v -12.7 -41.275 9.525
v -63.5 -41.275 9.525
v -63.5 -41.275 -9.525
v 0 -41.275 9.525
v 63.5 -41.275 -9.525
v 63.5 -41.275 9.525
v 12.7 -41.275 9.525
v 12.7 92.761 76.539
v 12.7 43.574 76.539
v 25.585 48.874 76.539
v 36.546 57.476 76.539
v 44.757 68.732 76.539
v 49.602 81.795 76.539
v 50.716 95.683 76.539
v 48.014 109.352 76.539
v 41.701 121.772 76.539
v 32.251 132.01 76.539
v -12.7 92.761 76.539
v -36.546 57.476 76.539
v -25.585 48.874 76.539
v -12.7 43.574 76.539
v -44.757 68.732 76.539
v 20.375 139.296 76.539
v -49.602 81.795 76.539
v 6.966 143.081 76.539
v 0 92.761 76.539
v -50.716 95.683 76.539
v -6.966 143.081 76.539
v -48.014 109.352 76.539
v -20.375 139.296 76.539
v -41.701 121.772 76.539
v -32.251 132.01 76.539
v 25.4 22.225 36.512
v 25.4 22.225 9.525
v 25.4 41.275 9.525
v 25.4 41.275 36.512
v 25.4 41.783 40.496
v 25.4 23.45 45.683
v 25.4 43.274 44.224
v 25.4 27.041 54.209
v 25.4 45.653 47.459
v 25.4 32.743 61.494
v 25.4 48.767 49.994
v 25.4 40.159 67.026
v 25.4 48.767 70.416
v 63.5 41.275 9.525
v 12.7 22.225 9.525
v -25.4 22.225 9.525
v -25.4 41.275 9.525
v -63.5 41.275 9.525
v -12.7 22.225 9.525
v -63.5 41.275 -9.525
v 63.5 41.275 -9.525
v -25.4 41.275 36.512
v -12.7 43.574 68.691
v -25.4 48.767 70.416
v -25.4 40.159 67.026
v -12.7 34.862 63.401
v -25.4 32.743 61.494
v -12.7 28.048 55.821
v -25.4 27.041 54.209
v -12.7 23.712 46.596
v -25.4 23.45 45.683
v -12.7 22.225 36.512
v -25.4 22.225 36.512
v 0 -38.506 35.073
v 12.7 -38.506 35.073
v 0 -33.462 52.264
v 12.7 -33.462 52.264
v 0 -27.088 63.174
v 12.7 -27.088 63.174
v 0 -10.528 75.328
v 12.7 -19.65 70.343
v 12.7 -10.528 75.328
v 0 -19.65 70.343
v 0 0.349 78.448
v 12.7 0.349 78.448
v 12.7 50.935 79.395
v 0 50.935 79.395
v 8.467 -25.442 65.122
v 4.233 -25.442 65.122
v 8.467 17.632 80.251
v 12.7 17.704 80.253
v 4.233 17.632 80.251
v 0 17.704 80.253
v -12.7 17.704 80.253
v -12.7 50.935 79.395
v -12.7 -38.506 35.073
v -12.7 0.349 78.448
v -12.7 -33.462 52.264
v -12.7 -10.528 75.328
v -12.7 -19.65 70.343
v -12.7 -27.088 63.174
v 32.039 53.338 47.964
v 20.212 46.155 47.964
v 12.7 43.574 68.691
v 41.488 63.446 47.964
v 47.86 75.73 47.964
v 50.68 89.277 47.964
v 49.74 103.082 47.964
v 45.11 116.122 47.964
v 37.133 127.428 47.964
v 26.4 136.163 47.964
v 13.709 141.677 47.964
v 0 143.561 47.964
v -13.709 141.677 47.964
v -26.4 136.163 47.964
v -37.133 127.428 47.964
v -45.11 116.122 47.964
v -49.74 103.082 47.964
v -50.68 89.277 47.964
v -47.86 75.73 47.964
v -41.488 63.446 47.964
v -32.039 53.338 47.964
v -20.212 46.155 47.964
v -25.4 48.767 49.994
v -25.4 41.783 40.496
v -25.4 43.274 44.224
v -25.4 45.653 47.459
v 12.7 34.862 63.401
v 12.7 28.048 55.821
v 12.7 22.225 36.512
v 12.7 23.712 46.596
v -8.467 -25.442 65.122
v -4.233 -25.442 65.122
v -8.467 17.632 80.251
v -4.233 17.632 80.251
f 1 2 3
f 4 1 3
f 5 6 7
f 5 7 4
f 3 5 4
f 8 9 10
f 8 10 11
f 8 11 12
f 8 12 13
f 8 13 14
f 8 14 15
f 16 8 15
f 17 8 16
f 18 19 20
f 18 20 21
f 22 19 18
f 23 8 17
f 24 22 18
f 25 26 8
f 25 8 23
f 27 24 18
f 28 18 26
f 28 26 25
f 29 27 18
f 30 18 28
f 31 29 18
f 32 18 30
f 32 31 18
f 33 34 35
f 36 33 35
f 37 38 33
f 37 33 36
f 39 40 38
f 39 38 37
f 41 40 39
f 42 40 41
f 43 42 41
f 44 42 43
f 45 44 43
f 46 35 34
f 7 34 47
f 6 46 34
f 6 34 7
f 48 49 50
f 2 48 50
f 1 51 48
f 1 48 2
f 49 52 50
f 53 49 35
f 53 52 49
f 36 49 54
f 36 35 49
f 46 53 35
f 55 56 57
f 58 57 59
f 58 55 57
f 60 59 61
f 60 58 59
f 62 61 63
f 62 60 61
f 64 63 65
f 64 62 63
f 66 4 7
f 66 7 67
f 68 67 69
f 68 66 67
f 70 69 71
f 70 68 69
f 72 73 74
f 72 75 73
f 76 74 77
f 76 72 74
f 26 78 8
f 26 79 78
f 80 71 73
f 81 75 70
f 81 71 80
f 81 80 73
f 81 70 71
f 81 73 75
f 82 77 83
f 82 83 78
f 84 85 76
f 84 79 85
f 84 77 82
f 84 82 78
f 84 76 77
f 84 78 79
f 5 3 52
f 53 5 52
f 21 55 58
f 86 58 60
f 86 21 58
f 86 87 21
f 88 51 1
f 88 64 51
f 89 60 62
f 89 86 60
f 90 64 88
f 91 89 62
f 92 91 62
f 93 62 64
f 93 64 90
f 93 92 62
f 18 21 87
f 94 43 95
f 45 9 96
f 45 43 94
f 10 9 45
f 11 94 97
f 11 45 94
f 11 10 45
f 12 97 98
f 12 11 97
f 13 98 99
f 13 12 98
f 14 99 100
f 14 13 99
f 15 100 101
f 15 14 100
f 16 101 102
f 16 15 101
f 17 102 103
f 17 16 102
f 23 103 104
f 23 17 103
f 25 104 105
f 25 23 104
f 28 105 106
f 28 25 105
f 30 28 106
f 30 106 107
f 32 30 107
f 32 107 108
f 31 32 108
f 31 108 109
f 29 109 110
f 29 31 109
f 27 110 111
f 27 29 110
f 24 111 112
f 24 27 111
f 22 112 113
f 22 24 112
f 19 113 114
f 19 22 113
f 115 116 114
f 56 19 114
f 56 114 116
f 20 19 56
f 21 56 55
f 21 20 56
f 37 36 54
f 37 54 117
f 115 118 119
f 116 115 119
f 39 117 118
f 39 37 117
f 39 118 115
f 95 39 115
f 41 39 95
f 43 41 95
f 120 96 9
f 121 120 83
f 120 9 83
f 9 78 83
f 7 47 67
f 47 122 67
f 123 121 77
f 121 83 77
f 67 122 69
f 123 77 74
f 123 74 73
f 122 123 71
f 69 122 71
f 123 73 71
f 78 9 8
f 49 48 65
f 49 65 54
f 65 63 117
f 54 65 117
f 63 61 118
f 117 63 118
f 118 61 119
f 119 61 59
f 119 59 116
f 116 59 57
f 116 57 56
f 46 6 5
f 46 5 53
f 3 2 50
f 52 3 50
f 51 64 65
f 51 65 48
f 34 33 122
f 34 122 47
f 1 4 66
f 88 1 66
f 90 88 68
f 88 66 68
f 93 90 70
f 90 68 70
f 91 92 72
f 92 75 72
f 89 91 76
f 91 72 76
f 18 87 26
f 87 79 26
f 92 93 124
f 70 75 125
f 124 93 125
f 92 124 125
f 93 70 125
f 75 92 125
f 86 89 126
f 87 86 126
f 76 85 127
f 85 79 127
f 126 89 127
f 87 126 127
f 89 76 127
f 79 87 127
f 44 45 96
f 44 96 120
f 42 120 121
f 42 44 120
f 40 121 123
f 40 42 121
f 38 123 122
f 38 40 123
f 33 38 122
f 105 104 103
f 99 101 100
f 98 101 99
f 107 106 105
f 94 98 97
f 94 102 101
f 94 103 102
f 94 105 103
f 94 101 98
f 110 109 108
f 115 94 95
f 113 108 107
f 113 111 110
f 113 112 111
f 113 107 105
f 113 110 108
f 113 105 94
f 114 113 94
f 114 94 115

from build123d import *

# Parameters (mm, degrees)
F1_DEPTH = 63.5
F2_DEPTH = 25.4
F3_DEPTH = 12.7


with BuildPart() as f1:
    # F0 (on Right) → F1 (new body, symmetric)
    with BuildSketch(Plane.YZ):
        Polygon((22.225, 9.525), (-41.275, 9.525), (-41.275, -9.525), (41.275, -9.525), (41.275, 9.525), align=None)
    extrude(amount=F1_DEPTH, both=True)

    # F0 (on Right) → F2 (join, symmetric)
    with BuildSketch(Plane.YZ):
        with BuildLine():
            Line((22.225, 36.5125), (22.225, 9.525))
            Line((22.225, 9.525), (41.275, 9.525))
            Line((41.275, 9.525), (41.275, 36.5125))
            ThreePointArc((41.275, 36.5125), (45.92468, 47.73782), (57.15, 52.3875))
            Line((57.15, 52.3875), (92.761105, 52.3875))
            Line((92.761105, 52.3875), (92.761105, 71.4375))
            Line((92.761105, 71.4375), (57.15, 71.4375))
            ThreePointArc((57.15, 71.4375), (32.454296, 61.208204), (22.225, 36.5125))
        make_face()
    extrude(amount=F2_DEPTH, both=True)

    # F0 (on Right) → F3 (join, symmetric)
    with BuildSketch(Plane.YZ):
        with BuildLine():
            add(Edge.make_bspline(
                [(-41.275, 9.525), (-37.458211, 92.56649), (0, 82.461342), (92.761105, 76.538539)],
                knots=[0, 0, 0, 0, 149.854902, 149.854902, 149.854902, 149.854902], degree=3))
            Line((-41.275, 9.525), (22.225, 9.525))
            Line((22.225, 9.525), (22.225, 36.5125))
            ThreePointArc((22.225, 36.5125), (32.454296, 61.208204), (57.15, 71.4375))
            Line((57.15, 71.4375), (92.761105, 71.4375))
            Line((92.761105, 71.4375), (92.761105, 76.538539))
        make_face()
    extrude(amount=F3_DEPTH, both=True)

    # F0 (on Right) → F4 (revolve)
    with BuildSketch(Plane.YZ):
        Polygon((143.561105, 76.538539), (92.761105, 76.538539), (92.761105, 71.4375), (92.761105, 52.3875), (92.761105, 47.963539), (143.561105, 47.963539), align=None)
    revolve(axis=Axis((0, 92.761105, 62.251039), (0, 0, 1)))


solid = f1.part
